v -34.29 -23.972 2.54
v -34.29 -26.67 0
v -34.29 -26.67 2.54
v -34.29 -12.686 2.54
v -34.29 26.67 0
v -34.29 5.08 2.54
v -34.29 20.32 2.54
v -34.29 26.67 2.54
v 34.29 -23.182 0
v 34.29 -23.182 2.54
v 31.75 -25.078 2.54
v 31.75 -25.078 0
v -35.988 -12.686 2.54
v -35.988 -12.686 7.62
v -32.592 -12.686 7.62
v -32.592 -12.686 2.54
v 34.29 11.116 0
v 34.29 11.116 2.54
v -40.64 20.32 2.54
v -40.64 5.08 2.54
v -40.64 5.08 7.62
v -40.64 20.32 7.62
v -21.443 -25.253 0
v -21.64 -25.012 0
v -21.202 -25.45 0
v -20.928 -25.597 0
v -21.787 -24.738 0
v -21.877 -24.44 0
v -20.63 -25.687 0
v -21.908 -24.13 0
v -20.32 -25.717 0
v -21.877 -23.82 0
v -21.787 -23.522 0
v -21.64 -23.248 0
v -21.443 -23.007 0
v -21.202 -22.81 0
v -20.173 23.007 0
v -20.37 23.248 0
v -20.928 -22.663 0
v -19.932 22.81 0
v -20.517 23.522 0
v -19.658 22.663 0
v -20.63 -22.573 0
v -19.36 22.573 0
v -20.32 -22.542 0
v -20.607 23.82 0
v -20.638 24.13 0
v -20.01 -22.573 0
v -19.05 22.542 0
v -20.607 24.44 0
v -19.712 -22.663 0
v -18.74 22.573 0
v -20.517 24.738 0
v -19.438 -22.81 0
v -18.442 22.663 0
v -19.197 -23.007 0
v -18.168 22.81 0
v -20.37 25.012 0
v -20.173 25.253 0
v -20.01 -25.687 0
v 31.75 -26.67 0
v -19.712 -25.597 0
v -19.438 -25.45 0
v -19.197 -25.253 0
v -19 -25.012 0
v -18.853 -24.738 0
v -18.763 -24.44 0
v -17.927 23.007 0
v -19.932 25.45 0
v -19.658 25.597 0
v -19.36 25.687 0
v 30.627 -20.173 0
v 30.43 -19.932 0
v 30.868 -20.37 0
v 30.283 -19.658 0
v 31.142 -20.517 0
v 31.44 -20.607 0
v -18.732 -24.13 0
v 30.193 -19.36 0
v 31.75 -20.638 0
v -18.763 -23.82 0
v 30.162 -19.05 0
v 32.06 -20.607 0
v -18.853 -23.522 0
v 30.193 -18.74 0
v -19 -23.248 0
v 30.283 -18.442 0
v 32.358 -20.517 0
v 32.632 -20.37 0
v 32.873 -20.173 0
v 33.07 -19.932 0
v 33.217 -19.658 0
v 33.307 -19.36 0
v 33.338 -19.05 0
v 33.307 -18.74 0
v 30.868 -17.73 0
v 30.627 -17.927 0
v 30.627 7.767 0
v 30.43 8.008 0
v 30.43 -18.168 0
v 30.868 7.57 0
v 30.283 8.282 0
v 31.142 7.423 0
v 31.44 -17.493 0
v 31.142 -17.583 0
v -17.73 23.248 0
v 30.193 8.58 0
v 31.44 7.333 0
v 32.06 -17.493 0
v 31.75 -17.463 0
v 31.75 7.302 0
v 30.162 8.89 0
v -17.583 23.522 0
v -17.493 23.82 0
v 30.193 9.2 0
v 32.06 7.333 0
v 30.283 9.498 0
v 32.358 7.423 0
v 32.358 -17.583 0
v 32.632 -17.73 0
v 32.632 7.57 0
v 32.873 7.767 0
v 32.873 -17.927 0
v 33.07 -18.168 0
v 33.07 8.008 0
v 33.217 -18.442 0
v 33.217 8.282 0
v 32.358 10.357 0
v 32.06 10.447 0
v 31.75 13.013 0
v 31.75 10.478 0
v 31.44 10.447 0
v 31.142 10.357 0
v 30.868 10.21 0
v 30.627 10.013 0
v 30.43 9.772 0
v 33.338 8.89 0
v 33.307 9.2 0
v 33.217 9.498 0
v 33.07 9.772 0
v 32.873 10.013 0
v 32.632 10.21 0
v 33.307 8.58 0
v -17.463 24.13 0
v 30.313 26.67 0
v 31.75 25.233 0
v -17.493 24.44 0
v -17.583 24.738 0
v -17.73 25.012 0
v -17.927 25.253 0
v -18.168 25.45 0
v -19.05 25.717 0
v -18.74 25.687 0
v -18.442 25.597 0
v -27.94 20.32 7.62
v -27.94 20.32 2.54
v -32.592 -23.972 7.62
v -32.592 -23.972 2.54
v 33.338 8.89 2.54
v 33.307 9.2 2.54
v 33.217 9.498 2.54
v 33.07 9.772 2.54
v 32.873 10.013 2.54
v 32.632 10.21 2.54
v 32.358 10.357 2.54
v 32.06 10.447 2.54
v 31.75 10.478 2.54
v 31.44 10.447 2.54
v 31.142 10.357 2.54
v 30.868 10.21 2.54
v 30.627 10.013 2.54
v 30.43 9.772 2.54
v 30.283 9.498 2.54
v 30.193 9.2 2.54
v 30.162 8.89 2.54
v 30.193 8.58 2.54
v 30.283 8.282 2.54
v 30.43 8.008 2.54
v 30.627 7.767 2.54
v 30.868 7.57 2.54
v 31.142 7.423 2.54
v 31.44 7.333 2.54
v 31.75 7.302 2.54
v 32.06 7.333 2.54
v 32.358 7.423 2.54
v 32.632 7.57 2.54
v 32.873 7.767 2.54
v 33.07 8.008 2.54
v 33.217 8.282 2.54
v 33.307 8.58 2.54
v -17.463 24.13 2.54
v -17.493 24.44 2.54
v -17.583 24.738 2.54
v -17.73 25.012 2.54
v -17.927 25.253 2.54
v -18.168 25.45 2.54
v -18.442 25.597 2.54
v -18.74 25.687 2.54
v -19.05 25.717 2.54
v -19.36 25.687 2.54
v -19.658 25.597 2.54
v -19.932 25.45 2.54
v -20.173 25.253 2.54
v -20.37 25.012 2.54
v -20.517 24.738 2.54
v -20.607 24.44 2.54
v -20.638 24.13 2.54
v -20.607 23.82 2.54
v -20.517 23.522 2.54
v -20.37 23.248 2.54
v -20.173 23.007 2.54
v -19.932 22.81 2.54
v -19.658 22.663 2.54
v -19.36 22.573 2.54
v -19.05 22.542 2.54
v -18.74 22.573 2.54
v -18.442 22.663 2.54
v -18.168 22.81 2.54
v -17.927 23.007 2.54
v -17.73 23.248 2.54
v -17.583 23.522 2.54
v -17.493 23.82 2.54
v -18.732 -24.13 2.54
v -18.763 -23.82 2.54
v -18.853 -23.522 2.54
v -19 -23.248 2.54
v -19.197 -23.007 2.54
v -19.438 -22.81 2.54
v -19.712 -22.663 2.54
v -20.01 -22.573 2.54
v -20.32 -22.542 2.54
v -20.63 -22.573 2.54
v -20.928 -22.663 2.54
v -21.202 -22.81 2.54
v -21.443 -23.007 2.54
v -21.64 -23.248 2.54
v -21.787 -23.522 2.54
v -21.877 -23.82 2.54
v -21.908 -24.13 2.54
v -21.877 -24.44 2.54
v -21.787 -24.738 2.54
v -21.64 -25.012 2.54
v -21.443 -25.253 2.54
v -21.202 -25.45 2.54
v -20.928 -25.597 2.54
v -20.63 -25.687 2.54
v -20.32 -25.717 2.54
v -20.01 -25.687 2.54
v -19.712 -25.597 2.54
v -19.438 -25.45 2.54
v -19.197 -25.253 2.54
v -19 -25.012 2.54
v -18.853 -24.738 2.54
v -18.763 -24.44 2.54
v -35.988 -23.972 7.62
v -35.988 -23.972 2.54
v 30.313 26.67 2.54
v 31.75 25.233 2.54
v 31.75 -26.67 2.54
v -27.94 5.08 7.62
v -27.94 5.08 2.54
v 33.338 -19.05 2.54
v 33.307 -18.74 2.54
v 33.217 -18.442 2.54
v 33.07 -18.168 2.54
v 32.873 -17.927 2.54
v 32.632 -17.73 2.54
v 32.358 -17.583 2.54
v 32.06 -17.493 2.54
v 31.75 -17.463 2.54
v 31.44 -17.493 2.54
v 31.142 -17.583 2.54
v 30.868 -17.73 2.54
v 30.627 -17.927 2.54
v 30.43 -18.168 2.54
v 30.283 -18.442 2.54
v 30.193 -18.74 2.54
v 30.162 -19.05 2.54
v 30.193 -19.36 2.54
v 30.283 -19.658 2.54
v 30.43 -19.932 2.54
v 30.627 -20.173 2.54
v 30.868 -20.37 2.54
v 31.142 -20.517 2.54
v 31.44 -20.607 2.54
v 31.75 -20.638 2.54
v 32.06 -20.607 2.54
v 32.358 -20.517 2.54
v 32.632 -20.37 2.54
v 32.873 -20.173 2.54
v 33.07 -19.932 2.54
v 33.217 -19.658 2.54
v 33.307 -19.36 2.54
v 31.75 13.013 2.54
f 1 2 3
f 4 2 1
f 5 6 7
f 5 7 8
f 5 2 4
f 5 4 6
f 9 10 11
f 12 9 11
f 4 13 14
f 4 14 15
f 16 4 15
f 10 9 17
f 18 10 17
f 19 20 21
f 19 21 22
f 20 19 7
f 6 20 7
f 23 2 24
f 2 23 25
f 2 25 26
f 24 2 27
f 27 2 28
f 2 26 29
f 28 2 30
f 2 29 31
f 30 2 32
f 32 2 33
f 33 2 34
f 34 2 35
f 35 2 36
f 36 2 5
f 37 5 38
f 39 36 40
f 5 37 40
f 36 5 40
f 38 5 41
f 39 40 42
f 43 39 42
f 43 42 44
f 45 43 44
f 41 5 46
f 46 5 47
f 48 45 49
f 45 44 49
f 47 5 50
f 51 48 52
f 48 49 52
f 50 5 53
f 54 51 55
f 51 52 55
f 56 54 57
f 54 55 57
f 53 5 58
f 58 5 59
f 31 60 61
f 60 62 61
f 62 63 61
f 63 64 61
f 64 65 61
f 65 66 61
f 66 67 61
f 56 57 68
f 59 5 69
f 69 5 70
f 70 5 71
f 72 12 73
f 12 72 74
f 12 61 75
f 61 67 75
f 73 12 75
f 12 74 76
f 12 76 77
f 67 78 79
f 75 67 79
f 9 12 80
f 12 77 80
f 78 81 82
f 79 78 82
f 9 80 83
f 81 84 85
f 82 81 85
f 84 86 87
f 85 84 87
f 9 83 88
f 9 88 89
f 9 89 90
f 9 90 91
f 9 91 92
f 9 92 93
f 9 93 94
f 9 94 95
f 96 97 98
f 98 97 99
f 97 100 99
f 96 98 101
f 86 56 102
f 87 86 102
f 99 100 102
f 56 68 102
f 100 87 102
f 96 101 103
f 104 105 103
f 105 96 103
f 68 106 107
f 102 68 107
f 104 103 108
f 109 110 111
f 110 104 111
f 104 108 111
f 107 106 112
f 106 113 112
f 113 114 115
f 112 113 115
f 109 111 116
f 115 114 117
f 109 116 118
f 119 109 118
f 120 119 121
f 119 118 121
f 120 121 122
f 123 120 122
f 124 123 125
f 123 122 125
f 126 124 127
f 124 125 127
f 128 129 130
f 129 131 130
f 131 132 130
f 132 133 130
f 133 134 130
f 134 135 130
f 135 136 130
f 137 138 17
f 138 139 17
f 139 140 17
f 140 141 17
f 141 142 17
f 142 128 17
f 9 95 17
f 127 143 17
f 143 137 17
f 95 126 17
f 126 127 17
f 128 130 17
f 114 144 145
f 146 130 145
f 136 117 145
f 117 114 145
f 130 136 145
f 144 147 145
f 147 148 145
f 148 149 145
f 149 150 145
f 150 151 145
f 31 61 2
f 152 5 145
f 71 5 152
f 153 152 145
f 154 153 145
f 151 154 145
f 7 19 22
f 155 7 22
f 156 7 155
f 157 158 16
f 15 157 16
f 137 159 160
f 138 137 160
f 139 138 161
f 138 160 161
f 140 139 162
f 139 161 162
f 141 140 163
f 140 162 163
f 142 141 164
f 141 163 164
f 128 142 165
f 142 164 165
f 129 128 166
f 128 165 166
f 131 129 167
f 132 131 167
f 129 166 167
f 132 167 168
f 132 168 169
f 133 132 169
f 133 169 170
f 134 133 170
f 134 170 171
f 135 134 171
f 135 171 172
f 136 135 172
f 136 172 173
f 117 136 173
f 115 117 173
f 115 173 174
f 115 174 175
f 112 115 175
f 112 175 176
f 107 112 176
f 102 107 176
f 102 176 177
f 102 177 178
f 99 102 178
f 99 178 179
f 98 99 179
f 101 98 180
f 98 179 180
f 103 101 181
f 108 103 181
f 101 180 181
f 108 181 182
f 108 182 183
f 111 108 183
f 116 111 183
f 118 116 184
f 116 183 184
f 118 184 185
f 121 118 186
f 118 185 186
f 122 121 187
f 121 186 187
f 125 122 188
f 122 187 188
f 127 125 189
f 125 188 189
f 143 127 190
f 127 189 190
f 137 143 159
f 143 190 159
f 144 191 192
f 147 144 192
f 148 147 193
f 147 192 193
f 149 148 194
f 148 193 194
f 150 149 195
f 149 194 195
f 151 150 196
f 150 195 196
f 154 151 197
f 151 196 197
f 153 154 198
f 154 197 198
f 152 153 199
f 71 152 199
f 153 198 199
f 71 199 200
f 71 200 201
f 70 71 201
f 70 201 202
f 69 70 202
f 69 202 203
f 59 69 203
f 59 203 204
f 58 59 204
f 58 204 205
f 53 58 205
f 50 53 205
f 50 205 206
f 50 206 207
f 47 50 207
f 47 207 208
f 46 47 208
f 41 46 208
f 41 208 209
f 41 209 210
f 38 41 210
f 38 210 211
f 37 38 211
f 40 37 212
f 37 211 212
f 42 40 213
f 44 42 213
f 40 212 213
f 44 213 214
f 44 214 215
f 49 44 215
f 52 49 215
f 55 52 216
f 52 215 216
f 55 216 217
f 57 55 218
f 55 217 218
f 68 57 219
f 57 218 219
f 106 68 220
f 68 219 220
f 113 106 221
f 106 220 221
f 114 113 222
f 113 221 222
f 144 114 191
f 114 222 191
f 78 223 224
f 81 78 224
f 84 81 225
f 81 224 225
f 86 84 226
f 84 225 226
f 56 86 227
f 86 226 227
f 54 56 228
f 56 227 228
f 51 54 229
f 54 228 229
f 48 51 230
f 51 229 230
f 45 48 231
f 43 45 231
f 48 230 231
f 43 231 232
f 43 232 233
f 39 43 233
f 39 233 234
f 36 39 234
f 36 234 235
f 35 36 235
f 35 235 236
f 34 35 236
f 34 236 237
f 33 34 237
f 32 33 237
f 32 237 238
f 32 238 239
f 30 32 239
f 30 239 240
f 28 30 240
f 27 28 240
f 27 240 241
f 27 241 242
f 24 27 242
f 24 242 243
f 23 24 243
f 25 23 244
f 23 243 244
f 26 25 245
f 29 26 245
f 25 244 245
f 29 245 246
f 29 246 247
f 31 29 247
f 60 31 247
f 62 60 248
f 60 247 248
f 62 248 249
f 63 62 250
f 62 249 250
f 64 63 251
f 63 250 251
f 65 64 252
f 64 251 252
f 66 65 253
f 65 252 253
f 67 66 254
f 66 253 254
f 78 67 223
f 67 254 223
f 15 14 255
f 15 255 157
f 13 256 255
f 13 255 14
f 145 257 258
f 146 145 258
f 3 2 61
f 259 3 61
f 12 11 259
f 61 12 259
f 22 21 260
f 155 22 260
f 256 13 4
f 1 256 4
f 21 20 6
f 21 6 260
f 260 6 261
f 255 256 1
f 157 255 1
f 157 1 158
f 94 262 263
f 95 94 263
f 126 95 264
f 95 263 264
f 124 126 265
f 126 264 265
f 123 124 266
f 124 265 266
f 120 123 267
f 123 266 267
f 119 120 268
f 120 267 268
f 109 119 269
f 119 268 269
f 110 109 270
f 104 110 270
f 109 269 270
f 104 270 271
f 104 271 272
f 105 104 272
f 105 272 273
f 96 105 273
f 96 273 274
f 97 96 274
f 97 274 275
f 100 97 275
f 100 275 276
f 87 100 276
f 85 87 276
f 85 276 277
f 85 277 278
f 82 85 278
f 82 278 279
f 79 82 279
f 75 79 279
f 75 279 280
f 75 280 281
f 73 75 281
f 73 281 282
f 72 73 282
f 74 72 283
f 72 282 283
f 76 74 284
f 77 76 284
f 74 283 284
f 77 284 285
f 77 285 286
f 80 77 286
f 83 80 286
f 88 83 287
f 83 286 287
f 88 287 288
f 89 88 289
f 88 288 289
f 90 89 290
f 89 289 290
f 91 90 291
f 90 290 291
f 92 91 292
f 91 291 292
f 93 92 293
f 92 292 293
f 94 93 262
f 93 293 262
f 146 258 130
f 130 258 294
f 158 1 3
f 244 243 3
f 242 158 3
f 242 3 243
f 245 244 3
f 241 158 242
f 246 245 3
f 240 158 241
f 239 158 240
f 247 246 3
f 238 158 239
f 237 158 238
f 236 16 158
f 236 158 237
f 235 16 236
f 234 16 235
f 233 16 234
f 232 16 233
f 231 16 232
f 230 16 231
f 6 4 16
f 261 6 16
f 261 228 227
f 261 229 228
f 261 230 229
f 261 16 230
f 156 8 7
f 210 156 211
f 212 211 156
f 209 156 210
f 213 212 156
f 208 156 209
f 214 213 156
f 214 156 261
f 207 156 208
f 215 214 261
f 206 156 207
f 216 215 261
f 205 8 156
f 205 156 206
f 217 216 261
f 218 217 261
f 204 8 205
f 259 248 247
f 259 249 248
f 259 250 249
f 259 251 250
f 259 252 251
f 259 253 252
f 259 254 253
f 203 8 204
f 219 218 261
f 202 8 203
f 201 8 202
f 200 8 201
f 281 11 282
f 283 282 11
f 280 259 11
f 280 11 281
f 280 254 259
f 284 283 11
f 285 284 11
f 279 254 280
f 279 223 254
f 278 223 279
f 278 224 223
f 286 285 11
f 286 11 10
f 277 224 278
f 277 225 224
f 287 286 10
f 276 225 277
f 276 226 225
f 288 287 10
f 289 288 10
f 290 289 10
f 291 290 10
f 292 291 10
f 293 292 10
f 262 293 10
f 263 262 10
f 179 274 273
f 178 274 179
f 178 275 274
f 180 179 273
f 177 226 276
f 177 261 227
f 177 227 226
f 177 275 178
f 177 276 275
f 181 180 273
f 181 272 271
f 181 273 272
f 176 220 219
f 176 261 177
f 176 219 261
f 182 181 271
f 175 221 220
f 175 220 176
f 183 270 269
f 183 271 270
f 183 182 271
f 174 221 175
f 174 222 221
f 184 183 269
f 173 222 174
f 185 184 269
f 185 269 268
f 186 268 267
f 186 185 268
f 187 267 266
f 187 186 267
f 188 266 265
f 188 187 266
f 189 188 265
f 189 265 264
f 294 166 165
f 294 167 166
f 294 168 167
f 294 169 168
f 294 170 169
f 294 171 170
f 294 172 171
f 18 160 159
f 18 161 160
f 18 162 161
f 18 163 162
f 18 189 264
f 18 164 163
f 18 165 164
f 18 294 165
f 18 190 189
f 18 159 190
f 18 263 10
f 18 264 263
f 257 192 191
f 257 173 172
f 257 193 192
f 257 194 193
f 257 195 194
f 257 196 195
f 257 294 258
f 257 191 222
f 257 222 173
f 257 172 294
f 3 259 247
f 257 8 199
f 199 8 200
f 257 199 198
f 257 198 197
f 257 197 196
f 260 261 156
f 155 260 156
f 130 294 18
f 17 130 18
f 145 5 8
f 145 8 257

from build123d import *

# Parameters (mm, degrees)
SKETCH1_W           = 68.58
SKETCH1_H           = 53.34
BOSS_EXTRUDE1_DEPTH = 2.54
SKETCH2_W           = 12.7
SKETCH2_H           = 15.24
SKETCH2_W_2         = 3.39503639
SKETCH2_H_2         = 11.2855496
BOSS_EXTRUDE2_DEPTH = 5.08
SKETCH3_R           = 1.5875
CUT_EXTRUDE1_DEPTH  = 10.16
CUT_EXTRUDE2_DEPTH  = 3.54


with BuildPart() as part:
    # Sketch1 → Boss-Extrude1 (new body)
    with BuildSketch(Plane.XY):
        Rectangle(SKETCH1_W, SKETCH1_H)
    extrude(amount=BOSS_EXTRUDE1_DEPTH)

    # Sketch2 → Boss-Extrude2 (add)
    with BuildSketch(Plane.XY.offset(2.54)):
        with Locations((-34.29, 12.7)):
            Rectangle(SKETCH2_W, SKETCH2_H)
        with Locations((-34.29, -18.328779787)):
            Rectangle(SKETCH2_W_2, SKETCH2_H_2)
    extrude(amount=BOSS_EXTRUDE2_DEPTH)

    # Sketch3 → Cut-Extrude1 (cut)
    with BuildSketch(Plane.XY.offset(2.54)):
        with Locations((-19.05, 24.13)):
            Circle(SKETCH3_R)
        with Locations((-20.32, -24.13)):
            Circle(SKETCH3_R)
        with Locations((31.75, 8.89)):
            Circle(SKETCH3_R)
        with Locations((31.75, -19.05)):
            Circle(SKETCH3_R)
    extrude(amount=-CUT_EXTRUDE1_DEPTH, mode=Mode.SUBTRACT)

    # Sketch4 → Cut-Extrude2 (cut, through all)
    with BuildSketch(Plane.XY.offset(2.54)):
        Polygon((30.313159021, 26.67), (31.75, 25.233159021), (31.75, 13.012702255), (34.29, 11.115796447), (34.29, 26.67), align=None)
        Polygon((34.29, -23.181547096), (31.75, -25.078452904), (31.75, -26.67), (34.29, -26.67), align=None)
    extrude(amount=-CUT_EXTRUDE2_DEPTH, mode=Mode.SUBTRACT)


solid = part.part
